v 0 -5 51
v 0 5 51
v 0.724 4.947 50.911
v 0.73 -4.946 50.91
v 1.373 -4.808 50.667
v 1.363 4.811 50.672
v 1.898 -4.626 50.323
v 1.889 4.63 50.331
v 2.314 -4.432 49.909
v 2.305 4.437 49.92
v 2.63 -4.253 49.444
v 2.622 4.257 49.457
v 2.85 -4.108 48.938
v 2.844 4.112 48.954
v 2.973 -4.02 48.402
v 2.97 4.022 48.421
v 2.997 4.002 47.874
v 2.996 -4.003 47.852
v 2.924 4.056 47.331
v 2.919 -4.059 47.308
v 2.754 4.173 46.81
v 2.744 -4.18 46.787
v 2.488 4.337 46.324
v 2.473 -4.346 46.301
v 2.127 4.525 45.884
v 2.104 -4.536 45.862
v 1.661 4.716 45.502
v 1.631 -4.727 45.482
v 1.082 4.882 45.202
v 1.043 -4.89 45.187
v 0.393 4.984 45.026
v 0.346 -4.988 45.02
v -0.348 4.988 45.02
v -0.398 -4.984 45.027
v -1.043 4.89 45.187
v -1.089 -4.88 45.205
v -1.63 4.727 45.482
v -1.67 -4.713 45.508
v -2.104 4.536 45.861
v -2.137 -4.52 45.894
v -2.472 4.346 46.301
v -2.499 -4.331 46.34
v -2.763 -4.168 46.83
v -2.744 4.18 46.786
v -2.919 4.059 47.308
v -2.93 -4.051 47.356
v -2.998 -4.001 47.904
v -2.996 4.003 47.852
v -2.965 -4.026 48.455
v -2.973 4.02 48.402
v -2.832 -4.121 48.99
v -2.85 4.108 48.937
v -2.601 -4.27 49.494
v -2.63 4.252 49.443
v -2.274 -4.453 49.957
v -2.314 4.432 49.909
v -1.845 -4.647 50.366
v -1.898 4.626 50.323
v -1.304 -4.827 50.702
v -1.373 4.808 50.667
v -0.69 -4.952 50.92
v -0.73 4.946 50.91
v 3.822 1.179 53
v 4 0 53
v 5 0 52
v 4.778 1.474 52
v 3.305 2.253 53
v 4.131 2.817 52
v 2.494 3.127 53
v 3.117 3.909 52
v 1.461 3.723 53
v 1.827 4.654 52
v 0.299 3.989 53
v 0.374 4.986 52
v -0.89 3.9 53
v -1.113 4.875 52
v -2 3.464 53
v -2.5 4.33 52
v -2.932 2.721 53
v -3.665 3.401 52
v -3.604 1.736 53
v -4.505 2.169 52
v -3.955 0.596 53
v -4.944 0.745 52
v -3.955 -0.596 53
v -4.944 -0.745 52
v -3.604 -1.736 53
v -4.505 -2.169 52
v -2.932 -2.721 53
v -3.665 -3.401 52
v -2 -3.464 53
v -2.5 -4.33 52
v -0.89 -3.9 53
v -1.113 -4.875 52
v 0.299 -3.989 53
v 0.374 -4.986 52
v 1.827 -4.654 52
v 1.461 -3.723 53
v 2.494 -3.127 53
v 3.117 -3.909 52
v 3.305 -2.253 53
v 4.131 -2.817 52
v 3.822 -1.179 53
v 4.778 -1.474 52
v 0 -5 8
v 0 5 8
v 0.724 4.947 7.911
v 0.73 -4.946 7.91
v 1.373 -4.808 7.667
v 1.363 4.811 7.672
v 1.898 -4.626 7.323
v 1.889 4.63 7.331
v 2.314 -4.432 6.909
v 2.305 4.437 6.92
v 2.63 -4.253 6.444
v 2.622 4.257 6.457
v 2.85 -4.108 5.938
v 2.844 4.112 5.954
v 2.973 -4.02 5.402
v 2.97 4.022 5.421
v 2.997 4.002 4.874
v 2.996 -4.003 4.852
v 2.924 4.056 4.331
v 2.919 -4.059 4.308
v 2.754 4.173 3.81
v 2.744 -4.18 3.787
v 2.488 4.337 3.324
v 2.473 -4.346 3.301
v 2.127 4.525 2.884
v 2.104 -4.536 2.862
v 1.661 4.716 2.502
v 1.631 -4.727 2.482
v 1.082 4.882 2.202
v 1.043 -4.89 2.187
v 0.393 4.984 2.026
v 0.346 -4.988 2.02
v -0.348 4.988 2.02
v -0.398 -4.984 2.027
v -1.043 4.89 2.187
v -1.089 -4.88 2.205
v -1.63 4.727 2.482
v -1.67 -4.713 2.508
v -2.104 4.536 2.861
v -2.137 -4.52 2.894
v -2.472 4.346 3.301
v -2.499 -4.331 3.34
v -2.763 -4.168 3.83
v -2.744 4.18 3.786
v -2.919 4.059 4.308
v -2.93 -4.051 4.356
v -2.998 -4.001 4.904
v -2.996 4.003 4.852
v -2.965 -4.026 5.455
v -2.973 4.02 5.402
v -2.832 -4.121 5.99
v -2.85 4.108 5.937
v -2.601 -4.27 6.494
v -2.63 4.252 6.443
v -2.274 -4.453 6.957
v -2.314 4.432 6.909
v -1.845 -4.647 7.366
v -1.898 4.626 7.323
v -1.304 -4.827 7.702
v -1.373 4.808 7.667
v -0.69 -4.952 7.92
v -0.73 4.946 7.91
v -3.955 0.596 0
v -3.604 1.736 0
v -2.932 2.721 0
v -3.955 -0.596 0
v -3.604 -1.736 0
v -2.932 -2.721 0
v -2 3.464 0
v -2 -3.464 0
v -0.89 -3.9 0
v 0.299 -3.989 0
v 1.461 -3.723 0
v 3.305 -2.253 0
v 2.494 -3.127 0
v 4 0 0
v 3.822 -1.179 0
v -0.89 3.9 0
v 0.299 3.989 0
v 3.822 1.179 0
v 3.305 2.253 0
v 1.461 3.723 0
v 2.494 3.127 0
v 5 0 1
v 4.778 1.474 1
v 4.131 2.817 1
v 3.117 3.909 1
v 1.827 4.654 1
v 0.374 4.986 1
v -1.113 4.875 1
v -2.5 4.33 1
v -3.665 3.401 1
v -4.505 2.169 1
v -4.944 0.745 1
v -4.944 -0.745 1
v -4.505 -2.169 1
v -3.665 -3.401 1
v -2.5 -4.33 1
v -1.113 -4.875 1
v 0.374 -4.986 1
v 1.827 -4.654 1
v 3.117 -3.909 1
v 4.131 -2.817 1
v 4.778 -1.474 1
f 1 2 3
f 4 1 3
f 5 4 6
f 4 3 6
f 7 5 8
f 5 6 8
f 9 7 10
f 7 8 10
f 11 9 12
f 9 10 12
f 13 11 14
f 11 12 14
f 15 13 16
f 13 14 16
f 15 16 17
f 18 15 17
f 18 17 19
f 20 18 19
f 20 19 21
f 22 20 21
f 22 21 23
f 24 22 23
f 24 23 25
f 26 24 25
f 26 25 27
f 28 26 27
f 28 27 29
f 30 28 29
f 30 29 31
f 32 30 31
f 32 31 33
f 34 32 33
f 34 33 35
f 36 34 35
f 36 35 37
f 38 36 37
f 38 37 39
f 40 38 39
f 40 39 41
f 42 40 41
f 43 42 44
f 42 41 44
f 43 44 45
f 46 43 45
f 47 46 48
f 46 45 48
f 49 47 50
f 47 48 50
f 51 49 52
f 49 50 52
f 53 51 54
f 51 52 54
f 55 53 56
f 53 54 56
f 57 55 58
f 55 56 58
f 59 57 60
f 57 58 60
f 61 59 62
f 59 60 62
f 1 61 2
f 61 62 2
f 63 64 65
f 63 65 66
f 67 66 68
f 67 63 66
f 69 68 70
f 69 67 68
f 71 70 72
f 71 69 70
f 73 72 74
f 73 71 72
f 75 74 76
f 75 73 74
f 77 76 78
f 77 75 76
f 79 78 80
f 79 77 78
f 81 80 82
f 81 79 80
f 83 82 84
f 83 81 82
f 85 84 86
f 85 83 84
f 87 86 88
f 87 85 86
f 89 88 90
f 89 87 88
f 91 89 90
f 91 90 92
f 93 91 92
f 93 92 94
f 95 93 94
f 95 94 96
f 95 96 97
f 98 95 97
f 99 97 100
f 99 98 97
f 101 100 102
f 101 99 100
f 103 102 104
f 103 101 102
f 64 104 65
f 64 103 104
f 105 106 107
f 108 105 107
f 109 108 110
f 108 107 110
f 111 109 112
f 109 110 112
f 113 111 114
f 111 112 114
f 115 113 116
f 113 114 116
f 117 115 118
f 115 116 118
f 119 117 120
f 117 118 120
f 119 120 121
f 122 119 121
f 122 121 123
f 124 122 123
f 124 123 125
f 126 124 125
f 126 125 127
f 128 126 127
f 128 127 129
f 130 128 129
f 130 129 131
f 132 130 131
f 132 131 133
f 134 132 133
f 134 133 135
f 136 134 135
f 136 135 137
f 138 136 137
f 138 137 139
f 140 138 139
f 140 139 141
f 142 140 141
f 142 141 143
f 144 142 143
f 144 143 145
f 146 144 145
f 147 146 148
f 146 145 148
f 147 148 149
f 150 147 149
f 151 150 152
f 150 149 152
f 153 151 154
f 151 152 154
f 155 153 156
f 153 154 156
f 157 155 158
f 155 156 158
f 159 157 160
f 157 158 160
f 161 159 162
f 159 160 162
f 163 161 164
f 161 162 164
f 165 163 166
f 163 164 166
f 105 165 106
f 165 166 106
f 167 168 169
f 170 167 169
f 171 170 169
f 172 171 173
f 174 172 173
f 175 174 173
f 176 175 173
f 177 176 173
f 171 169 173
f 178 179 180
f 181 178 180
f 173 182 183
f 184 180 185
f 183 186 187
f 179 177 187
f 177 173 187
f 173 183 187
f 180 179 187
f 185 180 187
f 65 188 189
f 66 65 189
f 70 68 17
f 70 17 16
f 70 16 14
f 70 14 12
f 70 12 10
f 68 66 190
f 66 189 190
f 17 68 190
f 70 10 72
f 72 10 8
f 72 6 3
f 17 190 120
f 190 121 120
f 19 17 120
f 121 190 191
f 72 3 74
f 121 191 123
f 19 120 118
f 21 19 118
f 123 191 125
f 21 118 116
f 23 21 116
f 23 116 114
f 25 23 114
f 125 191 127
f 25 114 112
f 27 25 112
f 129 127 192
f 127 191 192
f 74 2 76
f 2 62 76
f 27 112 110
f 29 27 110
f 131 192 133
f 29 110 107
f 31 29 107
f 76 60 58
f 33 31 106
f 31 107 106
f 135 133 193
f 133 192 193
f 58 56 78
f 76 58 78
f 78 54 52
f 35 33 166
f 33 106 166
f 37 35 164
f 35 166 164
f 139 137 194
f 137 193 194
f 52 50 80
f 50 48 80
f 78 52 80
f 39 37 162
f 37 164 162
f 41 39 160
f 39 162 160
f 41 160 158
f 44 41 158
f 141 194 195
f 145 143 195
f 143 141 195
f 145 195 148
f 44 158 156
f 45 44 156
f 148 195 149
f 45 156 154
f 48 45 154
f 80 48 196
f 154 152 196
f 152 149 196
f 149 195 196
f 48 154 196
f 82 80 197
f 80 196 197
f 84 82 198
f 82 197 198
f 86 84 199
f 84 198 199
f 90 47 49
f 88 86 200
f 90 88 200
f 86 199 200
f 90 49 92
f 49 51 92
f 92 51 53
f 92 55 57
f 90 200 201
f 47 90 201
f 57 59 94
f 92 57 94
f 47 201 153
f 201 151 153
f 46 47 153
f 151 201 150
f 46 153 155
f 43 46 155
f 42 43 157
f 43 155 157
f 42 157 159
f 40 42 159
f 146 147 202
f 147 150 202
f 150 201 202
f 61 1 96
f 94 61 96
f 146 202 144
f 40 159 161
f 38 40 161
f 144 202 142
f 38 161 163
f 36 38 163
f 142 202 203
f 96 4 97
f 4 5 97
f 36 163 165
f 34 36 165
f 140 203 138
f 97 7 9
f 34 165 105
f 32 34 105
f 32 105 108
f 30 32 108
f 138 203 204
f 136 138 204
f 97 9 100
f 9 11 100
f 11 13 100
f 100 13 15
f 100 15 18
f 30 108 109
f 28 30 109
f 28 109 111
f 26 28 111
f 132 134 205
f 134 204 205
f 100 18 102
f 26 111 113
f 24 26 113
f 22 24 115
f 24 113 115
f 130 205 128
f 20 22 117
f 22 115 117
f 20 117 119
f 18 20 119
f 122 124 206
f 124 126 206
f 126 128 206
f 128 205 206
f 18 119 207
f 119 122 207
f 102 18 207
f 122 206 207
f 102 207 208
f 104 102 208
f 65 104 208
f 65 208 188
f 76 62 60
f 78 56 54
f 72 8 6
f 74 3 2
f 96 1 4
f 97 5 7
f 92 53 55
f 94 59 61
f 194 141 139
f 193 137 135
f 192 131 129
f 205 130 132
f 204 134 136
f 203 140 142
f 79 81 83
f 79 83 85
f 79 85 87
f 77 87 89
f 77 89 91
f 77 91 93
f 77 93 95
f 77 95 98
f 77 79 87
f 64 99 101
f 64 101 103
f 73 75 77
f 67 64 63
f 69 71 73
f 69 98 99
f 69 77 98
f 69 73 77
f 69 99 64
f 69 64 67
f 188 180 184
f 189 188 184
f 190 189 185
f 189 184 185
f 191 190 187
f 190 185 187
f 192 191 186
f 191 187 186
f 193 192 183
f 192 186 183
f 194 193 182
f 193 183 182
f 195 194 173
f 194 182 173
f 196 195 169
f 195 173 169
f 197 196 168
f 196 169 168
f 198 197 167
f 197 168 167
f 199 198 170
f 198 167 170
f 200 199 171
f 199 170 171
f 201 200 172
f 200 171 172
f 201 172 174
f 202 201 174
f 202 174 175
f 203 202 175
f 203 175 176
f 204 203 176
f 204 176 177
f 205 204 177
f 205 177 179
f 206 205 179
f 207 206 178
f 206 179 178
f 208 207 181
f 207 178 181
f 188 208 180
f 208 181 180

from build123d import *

# Parameters (mm, degrees)
SKIZZE1_R                       = 5
AUFSATZ_LINEAR_AUSTRAGEN1_DEPTH = 53
SKIZZE2_R                       = 3
SCHNITT_LINEAR_AUSTRAGEN1_DEPTH = 47
FASE1_SIZE                      = 1


with BuildPart() as part:
    # Skizze1 → Aufsatz-Linear austragen1 (new body)
    with BuildSketch(Plane.XY):
        Circle(SKIZZE1_R)
    extrude(amount=AUFSATZ_LINEAR_AUSTRAGEN1_DEPTH)

    # Skizze2 → Schnitt-Linear austragen1 (cut)
    with BuildSketch(Plane(origin=(0, 5, 0), x_dir=(1, 0, 0), z_dir=(0, 1, 0))):
        with Locations(Location((0, -5, 0), (0, 0, 270))):
            Circle(SKIZZE2_R)
        with Locations(Location((0, -48, 0), (0, 0, 270))):
            Circle(SKIZZE2_R)
    extrude(amount=-SCHNITT_LINEAR_AUSTRAGEN1_DEPTH, mode=Mode.SUBTRACT)

    # Fase1
    fase1_edges = [part.edges().sort_by_distance(p)[0] for p in [
        (-5, 0, 0),
        (-5, 0, 53),
    ]]
    chamfer(fase1_edges, length=FASE1_SIZE)


solid = part.part
